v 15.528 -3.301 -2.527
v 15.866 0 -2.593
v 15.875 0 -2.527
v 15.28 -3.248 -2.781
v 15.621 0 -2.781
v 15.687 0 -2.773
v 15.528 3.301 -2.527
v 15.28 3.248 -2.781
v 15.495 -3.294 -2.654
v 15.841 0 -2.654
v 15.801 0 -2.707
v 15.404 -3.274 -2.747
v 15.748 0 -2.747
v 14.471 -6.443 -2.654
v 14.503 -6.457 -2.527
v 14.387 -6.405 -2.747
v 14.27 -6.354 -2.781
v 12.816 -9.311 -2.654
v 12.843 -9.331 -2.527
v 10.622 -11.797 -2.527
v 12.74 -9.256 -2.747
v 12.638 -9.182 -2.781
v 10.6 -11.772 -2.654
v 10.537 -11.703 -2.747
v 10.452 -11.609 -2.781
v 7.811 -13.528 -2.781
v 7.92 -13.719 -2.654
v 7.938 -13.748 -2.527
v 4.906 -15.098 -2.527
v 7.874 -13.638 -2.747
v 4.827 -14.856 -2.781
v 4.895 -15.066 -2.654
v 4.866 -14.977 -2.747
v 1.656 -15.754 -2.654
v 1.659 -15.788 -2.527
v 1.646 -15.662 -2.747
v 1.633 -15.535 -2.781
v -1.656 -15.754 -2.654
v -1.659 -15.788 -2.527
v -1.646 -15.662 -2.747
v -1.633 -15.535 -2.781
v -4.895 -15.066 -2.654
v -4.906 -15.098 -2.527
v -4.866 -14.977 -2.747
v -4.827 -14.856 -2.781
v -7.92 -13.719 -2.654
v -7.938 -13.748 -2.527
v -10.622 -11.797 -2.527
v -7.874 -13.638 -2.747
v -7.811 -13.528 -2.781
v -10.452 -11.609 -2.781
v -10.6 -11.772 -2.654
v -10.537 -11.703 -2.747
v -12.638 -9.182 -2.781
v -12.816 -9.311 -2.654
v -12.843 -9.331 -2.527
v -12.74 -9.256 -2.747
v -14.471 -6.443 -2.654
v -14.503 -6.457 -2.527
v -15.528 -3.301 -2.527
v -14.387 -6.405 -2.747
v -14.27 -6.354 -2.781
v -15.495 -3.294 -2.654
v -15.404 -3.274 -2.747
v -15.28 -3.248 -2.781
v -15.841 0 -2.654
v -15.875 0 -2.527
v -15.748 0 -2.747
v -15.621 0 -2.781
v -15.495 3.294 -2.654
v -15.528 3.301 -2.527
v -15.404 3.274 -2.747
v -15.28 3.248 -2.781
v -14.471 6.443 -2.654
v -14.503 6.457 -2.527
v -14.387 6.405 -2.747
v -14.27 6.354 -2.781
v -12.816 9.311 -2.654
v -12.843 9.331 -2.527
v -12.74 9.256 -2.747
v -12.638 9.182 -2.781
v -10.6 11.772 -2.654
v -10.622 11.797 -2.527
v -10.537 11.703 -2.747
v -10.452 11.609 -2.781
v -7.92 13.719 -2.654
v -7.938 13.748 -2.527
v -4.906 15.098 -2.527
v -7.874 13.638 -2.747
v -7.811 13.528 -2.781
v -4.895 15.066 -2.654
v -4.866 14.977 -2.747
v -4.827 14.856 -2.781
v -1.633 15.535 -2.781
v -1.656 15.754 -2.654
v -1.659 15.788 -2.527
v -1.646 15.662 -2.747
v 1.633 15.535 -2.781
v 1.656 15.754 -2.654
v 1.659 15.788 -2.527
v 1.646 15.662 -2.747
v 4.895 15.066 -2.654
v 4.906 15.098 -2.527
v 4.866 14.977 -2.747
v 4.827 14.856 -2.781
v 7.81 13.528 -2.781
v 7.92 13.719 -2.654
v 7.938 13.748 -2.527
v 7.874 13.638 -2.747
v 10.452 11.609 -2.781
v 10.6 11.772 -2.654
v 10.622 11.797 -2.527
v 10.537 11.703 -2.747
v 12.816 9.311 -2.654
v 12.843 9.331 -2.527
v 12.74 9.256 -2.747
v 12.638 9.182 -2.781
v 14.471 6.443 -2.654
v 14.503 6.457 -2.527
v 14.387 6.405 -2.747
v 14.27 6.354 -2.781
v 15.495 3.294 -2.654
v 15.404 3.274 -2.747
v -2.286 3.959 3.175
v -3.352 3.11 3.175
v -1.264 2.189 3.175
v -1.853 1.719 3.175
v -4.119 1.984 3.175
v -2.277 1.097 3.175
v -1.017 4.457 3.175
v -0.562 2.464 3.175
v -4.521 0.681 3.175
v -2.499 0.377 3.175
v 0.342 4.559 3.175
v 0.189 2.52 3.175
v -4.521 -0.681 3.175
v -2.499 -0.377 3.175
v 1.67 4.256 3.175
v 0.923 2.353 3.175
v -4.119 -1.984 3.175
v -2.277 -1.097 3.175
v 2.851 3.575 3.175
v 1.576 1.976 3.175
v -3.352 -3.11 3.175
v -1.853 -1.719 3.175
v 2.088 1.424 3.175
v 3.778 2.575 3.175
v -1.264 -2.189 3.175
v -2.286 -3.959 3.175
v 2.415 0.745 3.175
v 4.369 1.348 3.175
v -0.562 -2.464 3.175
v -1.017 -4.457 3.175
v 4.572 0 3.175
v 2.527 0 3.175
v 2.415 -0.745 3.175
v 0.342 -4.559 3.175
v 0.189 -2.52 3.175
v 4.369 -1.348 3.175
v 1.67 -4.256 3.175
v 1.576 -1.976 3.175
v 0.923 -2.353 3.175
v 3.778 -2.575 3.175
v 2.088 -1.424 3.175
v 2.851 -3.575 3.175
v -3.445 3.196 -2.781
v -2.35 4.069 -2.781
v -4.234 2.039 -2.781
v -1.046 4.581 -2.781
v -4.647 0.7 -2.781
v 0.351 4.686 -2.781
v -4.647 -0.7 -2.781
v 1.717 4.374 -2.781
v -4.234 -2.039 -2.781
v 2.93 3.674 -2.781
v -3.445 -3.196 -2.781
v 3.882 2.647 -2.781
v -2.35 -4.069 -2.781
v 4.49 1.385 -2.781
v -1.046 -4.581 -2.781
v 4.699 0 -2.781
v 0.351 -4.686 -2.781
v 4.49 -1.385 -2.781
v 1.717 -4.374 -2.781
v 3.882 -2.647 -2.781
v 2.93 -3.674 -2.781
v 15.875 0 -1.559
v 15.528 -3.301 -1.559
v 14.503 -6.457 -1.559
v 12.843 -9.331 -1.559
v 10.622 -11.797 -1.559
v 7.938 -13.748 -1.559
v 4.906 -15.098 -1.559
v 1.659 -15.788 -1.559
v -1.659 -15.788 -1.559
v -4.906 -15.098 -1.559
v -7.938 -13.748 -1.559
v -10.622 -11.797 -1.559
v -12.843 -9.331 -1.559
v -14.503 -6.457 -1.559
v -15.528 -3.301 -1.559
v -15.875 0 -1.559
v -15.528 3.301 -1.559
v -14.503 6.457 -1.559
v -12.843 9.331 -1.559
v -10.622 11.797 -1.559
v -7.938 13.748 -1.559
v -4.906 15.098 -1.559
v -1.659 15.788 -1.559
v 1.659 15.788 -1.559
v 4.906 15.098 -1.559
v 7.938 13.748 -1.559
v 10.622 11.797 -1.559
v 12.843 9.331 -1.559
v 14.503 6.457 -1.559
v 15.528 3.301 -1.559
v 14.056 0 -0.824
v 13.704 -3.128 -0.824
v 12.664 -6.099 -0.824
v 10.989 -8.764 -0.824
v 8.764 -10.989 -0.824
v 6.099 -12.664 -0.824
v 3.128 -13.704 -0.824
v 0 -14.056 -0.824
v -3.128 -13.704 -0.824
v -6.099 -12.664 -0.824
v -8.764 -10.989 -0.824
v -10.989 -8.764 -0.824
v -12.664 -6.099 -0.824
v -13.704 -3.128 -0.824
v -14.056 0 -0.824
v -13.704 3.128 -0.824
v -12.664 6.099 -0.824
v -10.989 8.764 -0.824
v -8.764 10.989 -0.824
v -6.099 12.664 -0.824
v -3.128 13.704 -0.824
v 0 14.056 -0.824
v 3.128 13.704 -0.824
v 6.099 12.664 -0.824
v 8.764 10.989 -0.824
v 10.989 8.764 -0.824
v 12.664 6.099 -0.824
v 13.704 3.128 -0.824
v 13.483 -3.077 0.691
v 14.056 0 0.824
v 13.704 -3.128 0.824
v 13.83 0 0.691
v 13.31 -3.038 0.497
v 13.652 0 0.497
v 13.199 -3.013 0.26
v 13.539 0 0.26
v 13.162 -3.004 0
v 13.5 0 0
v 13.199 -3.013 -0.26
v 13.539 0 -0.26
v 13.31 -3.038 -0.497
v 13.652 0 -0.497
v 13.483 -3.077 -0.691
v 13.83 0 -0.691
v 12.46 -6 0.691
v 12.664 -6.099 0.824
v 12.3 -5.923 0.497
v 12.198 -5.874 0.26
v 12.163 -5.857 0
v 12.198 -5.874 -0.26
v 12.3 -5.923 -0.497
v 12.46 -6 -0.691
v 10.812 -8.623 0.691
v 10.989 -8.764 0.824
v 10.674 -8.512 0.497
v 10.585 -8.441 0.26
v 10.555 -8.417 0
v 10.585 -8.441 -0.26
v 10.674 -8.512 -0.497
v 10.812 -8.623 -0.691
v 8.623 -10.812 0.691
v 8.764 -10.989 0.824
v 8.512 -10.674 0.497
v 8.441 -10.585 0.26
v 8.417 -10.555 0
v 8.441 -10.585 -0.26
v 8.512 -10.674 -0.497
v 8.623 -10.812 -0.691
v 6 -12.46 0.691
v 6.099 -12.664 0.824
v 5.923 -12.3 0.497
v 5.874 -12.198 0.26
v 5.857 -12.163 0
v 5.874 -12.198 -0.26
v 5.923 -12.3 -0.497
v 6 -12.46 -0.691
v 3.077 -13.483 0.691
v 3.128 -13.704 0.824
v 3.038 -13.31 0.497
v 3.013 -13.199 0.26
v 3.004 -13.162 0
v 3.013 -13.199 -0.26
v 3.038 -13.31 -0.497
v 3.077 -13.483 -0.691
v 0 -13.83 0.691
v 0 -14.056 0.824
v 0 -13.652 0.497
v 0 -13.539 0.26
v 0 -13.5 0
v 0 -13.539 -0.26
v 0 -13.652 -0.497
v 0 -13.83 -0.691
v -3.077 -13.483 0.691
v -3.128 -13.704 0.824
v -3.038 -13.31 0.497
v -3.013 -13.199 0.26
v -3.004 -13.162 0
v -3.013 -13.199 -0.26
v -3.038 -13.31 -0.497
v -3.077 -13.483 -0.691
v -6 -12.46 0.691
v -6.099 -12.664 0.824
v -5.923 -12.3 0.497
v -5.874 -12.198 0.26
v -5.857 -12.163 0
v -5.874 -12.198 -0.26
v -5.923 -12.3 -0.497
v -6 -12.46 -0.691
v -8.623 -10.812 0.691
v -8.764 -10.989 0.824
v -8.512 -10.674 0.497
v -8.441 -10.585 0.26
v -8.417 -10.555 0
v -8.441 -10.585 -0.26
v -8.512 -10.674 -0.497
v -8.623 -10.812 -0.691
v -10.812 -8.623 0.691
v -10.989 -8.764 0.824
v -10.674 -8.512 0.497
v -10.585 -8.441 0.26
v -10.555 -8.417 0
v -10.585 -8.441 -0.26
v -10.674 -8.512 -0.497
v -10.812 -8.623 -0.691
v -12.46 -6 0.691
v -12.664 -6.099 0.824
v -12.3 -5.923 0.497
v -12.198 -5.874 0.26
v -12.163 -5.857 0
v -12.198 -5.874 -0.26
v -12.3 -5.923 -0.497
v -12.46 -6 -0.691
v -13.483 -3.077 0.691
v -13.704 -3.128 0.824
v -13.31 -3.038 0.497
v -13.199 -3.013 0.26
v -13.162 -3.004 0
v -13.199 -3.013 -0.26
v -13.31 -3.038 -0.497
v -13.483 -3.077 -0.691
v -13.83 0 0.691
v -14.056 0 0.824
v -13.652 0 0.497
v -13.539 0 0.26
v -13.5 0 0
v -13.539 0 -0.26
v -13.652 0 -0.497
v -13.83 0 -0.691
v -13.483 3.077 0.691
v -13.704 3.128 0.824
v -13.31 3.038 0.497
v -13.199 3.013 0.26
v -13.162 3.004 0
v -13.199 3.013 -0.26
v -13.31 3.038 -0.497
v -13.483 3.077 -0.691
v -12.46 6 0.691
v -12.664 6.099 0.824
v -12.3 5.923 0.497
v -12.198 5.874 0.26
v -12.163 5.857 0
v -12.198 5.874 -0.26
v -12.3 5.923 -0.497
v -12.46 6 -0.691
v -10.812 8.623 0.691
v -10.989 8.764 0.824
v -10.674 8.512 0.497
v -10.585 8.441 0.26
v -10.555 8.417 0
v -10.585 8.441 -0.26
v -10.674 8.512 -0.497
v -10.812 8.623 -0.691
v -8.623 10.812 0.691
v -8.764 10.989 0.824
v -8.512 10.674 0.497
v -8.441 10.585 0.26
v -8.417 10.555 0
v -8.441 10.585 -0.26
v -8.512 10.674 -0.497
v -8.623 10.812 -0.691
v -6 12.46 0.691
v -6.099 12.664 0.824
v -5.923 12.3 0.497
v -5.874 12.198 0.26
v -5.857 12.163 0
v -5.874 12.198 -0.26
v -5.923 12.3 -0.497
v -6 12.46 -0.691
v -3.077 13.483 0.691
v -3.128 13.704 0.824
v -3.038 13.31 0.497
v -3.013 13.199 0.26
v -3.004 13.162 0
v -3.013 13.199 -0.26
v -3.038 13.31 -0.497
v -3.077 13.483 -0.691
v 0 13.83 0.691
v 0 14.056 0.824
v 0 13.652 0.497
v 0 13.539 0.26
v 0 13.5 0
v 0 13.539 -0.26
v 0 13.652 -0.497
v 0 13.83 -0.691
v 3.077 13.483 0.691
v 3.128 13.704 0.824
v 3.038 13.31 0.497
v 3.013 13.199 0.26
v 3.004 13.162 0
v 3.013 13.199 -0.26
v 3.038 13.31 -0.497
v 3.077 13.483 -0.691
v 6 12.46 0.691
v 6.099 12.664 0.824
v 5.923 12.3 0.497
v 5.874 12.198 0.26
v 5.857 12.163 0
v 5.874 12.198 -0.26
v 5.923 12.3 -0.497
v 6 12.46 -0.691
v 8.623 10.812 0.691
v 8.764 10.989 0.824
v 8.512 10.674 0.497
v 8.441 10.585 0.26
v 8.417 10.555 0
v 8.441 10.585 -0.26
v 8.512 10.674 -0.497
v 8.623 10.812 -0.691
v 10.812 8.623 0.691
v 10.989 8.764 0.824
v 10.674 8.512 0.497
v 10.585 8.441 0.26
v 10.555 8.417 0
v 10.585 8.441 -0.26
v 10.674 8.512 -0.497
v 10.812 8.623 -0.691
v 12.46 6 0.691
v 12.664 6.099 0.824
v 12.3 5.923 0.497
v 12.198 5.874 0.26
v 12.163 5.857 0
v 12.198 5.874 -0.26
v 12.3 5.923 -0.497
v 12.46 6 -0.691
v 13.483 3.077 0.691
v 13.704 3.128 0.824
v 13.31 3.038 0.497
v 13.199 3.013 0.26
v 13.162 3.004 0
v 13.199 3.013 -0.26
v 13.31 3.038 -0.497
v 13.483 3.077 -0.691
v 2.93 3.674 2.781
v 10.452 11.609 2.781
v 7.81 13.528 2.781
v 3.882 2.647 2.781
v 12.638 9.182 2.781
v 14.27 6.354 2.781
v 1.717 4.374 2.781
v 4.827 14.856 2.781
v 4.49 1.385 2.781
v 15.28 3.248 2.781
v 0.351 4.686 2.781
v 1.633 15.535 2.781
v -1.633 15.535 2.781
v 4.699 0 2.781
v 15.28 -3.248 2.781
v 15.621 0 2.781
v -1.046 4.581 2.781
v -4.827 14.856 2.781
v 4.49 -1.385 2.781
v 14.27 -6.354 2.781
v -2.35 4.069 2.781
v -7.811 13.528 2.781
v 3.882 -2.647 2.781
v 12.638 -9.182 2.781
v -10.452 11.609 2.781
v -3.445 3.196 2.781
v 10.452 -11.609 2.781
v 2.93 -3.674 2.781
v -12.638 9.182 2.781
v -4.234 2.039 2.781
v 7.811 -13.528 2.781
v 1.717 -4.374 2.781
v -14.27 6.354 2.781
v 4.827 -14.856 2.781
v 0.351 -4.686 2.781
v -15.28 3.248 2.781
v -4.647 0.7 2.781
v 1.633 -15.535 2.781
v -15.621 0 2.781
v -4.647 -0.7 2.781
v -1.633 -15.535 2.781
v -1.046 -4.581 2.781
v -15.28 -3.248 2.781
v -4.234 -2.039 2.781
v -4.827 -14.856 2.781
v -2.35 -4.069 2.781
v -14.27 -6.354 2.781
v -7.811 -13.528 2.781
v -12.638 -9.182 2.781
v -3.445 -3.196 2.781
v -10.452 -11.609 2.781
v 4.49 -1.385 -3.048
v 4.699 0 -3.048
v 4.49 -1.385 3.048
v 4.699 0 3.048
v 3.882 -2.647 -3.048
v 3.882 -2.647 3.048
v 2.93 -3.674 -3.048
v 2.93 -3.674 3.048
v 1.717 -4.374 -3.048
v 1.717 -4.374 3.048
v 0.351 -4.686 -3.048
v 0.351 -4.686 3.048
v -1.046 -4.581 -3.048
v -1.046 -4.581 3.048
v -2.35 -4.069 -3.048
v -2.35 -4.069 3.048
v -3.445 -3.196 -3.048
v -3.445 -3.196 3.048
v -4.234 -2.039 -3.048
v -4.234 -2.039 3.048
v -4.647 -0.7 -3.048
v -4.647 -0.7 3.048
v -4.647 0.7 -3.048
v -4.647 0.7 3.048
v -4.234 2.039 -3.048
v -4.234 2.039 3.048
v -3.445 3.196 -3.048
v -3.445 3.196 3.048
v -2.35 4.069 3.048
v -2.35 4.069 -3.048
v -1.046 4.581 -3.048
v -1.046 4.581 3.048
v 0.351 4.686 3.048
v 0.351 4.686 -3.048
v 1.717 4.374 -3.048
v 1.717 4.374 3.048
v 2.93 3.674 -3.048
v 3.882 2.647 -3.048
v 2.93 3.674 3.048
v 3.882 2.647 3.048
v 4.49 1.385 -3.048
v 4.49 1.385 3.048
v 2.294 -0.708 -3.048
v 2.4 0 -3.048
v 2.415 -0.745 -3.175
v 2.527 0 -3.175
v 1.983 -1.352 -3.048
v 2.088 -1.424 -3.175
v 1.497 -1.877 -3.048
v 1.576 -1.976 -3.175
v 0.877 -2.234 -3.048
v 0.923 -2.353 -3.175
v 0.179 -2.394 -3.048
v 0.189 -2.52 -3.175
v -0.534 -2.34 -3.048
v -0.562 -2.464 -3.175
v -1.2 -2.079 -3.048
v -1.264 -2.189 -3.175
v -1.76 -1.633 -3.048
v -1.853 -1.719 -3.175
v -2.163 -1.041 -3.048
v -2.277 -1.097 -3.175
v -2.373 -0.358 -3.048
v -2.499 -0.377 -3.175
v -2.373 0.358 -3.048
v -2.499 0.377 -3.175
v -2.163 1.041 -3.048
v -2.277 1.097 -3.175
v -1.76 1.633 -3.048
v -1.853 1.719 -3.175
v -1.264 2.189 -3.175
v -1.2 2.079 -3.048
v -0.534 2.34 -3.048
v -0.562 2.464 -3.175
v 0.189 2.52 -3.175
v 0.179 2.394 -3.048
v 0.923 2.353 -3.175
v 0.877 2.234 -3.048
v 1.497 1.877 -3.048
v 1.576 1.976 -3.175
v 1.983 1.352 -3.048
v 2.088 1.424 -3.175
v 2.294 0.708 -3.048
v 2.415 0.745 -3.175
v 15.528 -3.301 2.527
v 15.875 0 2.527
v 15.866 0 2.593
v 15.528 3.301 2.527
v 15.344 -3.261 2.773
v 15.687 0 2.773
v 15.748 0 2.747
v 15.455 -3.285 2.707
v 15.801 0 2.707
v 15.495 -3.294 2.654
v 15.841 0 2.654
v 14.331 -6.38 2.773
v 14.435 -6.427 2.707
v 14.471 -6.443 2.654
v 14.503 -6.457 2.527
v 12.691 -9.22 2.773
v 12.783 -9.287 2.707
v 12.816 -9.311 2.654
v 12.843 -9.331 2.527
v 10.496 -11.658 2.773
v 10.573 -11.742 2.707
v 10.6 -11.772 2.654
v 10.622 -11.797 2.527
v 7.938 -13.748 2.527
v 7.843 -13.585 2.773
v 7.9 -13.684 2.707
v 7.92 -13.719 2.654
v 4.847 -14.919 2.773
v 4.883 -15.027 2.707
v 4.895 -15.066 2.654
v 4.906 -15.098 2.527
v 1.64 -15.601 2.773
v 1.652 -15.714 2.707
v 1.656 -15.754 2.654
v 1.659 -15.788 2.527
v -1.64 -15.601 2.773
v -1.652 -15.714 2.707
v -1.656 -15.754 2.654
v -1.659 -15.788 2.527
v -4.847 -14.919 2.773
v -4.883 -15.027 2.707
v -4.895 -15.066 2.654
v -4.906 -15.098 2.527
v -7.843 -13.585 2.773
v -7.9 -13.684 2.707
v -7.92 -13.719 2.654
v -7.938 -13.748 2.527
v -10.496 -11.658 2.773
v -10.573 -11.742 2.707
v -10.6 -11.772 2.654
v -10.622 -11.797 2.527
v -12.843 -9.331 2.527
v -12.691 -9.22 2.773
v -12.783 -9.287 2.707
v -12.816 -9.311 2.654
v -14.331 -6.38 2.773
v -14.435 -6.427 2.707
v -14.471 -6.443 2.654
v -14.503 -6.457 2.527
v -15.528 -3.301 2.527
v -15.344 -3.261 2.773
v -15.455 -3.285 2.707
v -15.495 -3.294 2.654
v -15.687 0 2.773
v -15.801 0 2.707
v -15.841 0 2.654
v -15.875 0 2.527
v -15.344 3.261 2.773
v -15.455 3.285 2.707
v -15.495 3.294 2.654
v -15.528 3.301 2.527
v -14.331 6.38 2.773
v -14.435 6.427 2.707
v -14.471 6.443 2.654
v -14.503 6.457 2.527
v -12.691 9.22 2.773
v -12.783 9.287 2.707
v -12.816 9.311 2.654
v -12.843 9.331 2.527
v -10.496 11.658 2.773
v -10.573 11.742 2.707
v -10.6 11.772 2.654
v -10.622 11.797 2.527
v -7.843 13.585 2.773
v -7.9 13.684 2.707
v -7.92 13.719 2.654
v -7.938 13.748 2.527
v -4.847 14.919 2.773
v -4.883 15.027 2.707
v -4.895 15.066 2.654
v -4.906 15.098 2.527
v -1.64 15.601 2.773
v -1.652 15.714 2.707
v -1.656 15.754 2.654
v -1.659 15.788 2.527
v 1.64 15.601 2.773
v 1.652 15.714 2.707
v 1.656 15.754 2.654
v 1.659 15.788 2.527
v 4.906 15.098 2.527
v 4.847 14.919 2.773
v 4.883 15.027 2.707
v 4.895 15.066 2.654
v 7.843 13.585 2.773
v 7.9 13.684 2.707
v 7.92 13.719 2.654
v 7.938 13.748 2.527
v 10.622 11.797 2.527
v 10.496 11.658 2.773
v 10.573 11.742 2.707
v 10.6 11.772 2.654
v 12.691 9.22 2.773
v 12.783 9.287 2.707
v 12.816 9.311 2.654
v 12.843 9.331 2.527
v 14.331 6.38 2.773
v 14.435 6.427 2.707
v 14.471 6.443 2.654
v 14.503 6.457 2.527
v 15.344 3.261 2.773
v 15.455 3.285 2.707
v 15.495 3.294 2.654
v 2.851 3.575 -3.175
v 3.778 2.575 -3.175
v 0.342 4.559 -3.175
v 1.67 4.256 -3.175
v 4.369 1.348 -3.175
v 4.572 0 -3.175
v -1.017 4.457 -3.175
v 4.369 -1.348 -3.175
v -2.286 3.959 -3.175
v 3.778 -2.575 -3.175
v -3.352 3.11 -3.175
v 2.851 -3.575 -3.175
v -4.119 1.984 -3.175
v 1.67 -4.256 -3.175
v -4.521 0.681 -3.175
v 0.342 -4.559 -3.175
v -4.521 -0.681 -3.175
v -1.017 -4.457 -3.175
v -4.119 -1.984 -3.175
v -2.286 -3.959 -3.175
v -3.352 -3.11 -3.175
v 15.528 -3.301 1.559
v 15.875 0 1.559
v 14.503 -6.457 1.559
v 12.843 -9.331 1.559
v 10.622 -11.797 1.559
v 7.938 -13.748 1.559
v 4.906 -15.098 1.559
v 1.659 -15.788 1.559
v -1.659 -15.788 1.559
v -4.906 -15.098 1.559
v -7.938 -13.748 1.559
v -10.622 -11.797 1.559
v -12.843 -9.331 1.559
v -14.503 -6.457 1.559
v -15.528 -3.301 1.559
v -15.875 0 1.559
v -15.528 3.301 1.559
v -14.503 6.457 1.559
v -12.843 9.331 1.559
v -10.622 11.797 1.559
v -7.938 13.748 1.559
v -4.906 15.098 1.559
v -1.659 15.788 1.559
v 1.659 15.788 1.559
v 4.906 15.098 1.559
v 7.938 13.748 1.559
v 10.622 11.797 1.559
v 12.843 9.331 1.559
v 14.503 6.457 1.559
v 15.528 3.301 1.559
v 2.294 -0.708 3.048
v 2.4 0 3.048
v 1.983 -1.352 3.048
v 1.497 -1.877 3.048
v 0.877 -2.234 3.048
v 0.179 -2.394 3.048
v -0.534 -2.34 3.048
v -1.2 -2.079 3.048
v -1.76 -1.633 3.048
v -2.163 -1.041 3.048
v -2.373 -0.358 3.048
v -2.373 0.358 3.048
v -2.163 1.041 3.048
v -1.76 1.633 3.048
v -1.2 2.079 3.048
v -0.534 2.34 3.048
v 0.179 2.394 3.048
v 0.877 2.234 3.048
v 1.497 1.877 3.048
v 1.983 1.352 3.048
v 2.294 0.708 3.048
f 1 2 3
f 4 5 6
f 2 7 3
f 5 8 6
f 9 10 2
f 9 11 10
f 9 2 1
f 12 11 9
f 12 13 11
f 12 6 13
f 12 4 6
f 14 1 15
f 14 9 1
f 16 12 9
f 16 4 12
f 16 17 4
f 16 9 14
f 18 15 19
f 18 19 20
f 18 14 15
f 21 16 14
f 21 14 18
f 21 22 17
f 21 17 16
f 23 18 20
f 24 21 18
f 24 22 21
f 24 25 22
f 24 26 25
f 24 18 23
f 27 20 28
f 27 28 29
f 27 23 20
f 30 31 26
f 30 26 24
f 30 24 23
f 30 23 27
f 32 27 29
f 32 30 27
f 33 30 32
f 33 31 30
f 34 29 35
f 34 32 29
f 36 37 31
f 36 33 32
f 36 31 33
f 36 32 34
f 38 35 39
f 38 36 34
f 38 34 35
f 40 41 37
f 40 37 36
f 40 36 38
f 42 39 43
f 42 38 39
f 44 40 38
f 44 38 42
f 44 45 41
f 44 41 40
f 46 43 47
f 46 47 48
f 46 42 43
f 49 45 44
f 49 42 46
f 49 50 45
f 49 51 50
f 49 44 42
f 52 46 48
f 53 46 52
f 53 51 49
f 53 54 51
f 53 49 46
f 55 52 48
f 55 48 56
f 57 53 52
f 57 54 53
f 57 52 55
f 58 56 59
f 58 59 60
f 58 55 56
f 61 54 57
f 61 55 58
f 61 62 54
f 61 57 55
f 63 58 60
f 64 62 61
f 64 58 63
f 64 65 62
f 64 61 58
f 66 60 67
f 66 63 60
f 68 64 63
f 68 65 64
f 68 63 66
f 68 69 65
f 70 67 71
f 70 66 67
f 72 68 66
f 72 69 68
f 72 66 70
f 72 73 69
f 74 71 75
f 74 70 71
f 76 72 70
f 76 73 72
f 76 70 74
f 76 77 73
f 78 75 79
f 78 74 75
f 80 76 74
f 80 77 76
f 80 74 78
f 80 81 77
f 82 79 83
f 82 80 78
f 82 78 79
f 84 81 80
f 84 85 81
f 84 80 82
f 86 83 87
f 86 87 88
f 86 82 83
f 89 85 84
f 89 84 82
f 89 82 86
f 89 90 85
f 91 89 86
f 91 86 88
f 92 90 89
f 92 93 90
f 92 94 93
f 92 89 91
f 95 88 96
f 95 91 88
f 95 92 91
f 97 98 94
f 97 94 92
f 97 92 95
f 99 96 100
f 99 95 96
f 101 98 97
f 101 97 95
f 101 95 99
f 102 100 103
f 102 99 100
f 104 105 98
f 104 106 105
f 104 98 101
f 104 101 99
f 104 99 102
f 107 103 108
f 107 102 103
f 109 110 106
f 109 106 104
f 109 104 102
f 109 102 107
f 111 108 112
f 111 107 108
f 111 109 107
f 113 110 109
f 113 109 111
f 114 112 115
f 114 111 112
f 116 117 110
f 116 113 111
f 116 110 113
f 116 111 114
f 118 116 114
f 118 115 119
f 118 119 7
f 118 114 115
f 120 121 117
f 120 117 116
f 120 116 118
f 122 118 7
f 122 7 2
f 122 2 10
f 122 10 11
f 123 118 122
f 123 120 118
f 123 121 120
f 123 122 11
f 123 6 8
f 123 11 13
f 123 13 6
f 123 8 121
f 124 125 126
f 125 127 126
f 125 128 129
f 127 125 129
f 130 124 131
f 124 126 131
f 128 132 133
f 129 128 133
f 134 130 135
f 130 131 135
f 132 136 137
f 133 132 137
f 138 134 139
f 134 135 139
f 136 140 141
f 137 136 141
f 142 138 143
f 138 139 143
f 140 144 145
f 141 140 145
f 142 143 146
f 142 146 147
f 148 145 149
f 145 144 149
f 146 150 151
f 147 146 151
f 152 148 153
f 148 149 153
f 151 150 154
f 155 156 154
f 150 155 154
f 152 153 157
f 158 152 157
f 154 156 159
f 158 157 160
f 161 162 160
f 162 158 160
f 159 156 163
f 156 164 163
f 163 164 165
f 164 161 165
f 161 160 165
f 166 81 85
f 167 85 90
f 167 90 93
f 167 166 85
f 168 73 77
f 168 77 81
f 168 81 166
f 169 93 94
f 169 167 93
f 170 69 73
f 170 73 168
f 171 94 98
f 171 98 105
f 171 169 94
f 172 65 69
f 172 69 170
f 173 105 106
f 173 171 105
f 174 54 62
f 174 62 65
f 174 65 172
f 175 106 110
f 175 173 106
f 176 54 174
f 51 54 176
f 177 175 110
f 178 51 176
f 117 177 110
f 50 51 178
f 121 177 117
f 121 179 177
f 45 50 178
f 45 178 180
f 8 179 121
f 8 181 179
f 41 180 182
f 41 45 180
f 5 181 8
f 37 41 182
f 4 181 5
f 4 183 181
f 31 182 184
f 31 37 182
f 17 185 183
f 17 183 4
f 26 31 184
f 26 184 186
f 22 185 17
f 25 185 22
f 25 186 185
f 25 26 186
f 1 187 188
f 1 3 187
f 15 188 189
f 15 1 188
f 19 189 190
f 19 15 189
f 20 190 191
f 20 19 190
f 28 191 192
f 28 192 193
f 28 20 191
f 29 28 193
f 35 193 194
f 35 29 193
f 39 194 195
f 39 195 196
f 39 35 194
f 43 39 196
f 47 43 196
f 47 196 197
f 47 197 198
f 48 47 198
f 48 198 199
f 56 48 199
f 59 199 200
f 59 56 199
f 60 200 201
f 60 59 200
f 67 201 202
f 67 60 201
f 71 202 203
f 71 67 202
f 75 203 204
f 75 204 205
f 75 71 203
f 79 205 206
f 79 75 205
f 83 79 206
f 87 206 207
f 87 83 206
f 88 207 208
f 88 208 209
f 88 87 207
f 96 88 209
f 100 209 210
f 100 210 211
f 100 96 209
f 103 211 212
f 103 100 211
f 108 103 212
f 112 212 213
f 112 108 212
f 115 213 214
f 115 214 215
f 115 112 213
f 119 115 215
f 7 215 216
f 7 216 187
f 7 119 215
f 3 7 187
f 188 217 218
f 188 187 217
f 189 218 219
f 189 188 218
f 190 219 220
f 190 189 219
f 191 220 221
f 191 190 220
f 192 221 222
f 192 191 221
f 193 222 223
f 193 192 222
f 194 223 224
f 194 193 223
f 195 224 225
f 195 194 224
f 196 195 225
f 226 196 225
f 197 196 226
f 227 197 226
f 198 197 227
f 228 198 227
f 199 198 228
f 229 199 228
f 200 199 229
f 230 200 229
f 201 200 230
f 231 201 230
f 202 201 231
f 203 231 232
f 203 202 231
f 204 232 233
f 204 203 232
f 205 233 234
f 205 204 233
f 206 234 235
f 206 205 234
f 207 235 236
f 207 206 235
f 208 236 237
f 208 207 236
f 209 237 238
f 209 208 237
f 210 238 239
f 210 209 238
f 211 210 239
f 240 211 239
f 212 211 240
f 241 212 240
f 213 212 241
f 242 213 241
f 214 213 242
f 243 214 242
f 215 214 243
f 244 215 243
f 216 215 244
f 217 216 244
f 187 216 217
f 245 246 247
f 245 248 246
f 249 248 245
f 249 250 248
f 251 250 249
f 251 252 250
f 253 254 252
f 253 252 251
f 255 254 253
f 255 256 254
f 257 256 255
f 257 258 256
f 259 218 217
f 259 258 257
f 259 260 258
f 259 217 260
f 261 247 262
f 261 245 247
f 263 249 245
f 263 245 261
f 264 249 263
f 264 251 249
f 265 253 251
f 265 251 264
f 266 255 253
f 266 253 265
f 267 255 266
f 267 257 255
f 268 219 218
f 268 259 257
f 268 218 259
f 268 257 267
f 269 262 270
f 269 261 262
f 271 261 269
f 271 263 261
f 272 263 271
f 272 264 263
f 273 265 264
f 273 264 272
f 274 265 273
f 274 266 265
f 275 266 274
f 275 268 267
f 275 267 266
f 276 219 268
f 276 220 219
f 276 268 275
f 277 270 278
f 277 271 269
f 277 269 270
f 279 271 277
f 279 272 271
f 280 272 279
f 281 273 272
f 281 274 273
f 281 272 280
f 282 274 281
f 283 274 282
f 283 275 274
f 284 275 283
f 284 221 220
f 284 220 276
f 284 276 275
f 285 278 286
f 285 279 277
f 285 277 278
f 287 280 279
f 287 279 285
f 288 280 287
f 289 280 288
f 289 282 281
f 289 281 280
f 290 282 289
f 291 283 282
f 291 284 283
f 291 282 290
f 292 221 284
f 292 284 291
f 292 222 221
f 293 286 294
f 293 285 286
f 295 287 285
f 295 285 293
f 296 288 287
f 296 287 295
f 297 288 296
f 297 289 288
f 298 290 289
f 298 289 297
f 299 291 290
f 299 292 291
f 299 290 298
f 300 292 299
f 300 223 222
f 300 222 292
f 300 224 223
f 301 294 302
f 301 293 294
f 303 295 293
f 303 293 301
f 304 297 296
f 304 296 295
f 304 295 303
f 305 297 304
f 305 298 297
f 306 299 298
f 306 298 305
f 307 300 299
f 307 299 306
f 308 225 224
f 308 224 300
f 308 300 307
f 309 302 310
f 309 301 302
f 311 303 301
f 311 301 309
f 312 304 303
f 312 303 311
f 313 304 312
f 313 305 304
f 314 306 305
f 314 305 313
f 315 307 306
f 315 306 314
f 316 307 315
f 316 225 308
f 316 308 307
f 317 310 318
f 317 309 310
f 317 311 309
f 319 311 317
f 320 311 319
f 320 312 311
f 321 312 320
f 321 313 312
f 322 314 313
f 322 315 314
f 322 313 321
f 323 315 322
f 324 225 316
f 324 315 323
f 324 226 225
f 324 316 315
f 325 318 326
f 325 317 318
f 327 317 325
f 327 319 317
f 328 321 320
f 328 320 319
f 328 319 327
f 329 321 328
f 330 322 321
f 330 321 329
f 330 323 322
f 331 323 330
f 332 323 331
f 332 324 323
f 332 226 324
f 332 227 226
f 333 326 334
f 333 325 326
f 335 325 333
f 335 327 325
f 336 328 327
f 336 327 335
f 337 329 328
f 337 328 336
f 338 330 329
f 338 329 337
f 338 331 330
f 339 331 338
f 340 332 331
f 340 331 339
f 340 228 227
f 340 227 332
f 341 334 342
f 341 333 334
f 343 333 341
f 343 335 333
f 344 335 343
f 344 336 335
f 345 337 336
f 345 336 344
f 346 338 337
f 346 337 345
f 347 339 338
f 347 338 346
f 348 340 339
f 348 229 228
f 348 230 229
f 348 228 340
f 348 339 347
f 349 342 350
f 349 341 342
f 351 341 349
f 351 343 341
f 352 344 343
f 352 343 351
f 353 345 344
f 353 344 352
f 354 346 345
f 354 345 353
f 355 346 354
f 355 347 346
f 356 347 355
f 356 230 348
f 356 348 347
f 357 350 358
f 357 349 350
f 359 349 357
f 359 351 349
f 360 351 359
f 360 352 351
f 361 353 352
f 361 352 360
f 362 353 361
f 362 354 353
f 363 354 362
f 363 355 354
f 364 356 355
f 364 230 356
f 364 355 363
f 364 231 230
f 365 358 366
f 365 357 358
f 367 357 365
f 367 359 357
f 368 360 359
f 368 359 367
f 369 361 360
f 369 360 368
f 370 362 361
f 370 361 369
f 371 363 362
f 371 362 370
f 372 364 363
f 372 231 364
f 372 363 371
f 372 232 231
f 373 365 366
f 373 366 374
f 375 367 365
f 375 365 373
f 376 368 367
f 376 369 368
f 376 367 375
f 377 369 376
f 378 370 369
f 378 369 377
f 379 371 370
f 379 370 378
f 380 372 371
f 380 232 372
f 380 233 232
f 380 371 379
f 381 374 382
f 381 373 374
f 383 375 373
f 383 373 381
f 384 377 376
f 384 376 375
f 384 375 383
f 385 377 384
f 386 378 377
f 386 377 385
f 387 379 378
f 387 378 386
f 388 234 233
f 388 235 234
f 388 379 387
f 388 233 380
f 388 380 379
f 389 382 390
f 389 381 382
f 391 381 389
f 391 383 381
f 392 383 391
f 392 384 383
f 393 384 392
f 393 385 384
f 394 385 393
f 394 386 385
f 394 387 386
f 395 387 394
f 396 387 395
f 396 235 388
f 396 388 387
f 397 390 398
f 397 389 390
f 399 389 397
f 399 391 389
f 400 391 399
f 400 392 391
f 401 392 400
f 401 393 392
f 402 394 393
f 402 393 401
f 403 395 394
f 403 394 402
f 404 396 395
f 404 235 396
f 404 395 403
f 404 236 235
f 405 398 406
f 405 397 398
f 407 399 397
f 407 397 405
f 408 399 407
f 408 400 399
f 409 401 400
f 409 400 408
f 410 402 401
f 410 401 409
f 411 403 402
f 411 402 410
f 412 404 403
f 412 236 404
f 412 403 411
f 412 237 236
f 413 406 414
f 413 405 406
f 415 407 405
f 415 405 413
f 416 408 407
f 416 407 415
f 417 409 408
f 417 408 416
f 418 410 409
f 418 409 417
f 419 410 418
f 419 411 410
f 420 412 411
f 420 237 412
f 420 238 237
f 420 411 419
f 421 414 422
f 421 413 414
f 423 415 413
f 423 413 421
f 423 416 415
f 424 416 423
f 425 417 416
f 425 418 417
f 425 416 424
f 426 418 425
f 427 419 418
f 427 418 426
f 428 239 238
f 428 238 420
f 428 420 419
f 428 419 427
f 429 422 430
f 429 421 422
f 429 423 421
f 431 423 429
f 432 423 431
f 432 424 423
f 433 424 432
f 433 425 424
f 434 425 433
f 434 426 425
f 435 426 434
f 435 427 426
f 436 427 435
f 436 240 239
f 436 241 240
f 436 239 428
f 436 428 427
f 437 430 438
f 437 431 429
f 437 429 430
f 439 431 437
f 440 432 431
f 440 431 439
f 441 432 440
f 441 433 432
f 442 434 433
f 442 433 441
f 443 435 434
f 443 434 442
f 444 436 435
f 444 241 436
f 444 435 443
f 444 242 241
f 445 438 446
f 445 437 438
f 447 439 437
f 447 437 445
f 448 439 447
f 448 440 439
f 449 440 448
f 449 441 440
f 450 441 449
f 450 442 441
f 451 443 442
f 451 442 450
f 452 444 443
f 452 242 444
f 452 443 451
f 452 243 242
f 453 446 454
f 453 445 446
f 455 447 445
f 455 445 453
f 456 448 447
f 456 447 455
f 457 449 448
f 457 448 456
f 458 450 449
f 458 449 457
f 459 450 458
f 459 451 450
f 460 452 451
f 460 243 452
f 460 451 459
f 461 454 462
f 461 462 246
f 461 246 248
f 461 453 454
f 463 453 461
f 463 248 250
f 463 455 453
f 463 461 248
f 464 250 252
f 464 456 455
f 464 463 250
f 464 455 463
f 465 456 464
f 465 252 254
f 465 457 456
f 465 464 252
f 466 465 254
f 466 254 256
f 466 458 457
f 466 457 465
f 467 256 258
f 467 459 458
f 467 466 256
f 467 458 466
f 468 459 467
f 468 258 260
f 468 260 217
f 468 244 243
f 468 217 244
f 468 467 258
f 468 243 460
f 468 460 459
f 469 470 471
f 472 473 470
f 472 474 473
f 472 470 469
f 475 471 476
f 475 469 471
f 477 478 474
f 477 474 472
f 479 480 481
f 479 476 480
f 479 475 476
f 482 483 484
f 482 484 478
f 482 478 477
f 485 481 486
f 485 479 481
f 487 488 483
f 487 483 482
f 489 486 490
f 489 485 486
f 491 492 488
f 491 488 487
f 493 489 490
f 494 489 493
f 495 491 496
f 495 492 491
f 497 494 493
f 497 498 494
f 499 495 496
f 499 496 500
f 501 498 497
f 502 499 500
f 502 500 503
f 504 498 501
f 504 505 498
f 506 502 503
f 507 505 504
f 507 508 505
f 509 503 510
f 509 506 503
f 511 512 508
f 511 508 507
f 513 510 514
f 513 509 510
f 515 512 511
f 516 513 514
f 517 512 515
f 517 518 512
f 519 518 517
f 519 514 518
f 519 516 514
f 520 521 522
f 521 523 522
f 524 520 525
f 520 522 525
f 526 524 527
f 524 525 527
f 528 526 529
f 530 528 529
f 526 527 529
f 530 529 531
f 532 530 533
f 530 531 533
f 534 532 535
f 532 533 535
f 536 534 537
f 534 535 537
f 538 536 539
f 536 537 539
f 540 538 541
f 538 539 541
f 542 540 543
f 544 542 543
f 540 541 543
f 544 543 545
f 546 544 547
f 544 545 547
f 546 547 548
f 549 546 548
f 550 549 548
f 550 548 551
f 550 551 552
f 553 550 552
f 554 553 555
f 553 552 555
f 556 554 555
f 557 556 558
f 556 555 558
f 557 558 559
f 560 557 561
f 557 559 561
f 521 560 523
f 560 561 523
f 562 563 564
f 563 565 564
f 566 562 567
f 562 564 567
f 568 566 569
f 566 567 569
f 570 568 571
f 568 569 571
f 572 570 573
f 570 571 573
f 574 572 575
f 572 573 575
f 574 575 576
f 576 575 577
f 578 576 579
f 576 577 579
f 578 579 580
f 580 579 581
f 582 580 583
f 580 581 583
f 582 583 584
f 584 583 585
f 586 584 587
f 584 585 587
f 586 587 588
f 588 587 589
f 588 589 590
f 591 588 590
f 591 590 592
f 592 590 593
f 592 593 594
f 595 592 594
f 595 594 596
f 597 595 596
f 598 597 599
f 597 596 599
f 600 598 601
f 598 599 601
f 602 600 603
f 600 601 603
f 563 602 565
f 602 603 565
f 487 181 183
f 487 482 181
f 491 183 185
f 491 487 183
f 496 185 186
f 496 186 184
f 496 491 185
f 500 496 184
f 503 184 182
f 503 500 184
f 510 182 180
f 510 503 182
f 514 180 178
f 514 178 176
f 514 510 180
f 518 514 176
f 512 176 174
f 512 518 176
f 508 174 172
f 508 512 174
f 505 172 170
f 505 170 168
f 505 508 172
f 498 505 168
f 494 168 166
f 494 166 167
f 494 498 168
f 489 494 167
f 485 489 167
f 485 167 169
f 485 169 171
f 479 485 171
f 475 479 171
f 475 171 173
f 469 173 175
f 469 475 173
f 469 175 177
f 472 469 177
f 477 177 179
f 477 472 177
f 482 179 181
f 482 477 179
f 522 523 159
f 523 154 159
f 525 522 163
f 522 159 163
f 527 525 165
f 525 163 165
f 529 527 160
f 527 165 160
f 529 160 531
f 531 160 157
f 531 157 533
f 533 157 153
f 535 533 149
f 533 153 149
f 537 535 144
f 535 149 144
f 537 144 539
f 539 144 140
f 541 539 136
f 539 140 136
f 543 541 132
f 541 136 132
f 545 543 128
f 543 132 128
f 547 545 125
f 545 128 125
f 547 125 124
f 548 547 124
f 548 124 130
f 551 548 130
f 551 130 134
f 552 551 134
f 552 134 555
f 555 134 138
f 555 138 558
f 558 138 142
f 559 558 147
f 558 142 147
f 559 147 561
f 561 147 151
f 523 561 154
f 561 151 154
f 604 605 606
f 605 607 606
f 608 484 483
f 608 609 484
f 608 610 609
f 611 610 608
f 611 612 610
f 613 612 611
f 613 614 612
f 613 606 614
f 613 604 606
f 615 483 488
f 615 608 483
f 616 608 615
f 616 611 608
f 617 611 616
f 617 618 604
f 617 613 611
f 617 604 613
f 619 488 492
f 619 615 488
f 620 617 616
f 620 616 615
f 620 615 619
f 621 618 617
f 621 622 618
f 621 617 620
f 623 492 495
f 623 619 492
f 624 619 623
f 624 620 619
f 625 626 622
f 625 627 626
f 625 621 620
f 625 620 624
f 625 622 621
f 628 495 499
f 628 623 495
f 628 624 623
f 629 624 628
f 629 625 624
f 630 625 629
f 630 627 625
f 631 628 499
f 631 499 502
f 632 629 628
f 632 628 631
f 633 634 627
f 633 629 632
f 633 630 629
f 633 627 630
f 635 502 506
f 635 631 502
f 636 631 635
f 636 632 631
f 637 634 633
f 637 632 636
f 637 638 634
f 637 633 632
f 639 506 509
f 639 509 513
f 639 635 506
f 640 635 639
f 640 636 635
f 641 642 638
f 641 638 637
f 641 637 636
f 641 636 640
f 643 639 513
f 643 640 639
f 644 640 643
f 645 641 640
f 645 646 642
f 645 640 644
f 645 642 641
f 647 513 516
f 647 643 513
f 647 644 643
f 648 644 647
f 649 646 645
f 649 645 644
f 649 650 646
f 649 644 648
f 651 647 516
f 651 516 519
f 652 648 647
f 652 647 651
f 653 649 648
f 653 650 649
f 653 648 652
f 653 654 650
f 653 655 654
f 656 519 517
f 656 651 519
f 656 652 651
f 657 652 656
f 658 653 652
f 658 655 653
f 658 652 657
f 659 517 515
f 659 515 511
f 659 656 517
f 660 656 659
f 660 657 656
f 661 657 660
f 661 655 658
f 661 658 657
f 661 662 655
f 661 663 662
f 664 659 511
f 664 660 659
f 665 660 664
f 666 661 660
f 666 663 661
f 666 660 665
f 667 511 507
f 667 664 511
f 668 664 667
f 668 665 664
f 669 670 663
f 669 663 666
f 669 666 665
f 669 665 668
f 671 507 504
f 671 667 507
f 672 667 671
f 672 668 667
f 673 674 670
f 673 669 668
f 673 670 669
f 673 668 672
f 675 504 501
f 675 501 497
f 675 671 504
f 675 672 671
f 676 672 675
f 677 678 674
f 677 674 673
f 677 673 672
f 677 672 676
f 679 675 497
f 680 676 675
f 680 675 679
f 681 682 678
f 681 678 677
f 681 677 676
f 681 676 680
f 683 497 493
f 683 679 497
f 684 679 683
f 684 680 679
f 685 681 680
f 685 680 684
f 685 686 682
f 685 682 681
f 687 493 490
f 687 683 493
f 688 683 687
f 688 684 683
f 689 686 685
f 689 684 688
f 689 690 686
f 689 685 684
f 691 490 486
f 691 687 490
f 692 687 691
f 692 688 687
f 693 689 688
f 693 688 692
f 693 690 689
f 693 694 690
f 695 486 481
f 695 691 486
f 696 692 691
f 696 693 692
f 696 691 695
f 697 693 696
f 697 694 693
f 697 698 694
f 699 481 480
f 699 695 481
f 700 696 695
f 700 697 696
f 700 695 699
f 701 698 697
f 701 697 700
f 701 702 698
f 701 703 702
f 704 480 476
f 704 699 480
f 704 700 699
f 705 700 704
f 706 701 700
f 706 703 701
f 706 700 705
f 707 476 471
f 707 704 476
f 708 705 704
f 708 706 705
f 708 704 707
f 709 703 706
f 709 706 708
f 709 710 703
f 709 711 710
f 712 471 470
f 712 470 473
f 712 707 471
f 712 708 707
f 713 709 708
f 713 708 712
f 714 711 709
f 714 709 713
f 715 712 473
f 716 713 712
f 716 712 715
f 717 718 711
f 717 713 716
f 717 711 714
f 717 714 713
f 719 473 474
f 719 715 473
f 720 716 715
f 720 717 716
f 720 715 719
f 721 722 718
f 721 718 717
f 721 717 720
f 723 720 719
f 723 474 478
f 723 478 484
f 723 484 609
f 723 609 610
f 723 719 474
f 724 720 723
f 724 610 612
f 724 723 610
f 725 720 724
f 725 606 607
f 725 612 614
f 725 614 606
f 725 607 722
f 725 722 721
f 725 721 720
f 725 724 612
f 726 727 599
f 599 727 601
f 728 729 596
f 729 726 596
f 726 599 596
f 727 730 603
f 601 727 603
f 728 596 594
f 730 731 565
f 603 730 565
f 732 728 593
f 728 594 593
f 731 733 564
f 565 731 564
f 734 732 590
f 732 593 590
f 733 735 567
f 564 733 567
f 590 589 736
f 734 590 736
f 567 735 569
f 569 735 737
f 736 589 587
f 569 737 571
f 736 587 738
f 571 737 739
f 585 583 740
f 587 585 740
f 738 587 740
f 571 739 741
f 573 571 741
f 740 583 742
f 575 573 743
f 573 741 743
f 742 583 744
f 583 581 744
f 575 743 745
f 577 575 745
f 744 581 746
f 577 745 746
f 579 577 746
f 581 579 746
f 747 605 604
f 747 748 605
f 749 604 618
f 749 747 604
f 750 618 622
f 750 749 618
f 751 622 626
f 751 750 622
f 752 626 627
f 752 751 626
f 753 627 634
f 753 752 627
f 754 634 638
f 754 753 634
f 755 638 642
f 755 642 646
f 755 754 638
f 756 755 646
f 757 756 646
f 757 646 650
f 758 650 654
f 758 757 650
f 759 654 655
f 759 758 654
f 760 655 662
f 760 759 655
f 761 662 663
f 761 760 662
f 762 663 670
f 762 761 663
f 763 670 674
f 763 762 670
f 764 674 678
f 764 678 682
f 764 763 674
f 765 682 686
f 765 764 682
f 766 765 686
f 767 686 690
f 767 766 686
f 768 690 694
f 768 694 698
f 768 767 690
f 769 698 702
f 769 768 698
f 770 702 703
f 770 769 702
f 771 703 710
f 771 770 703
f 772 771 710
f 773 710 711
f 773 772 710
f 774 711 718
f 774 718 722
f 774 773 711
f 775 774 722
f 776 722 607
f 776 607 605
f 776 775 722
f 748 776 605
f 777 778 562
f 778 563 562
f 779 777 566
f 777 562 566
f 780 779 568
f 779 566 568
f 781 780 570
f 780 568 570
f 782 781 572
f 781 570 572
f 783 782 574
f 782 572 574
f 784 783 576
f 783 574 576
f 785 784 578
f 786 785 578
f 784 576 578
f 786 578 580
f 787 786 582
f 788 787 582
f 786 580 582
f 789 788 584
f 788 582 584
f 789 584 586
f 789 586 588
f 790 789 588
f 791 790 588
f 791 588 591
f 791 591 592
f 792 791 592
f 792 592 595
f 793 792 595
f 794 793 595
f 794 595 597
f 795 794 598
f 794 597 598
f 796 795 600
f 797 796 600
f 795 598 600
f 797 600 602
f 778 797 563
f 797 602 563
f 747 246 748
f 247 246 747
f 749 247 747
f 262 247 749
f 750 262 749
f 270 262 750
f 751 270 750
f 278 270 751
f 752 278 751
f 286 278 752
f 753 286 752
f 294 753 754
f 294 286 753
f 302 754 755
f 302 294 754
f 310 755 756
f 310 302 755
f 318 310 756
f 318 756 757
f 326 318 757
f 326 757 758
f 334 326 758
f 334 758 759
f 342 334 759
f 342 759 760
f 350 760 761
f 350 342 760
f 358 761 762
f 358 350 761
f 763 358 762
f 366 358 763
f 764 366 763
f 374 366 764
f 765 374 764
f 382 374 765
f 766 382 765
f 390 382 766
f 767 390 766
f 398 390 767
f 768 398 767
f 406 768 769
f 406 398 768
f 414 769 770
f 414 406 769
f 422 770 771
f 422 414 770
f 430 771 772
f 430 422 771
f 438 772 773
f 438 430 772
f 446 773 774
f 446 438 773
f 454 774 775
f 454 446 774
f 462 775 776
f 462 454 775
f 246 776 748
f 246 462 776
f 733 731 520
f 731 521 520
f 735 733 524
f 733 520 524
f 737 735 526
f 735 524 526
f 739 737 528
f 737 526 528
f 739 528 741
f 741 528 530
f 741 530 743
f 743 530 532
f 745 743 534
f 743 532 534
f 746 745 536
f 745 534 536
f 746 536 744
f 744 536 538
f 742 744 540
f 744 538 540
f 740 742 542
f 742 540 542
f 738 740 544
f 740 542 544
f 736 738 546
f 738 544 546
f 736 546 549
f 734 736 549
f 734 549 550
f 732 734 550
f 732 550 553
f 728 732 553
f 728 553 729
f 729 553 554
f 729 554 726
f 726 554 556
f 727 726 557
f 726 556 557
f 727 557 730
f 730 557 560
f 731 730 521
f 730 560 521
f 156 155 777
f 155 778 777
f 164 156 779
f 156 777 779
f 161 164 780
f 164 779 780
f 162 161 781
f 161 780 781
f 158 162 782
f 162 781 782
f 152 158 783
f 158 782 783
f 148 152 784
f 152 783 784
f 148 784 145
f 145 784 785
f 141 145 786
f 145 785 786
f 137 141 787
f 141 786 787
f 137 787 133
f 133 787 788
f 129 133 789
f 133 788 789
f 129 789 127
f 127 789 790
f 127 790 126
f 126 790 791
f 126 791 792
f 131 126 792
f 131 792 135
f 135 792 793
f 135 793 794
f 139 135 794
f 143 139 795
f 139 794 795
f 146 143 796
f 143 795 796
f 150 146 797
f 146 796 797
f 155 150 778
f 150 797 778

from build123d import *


with BuildPart() as part:
    # Sketch2 → Bushing Revolve (revolve)
    with BuildSketch(Plane(origin=(0, 0, 0), x_dir=(0, 0, -1), z_dir=(1, 0, 0)), mode=Mode.PRIVATE) as bushing_revolve_sk:
        Polygon((-3.175, 4.572), (-3.175, 2.5273), (-3.048, 2.4003), (3.048, 2.4003), (3.175, 2.5273), (3.175, 4.572), (3.048, 4.699), (-3.048, 4.699), align=None)
    revolve(bushing_revolve_sk.sketch.rotate(Axis((0, 0, 3.175), (0, 0, -1)), 90), axis=Axis((0, 0, 3.175), (0, 0, -1)))


with BuildPart() as body_2:
    # Sketch3 → Sheave Revolve (revolve)
    with BuildSketch(Plane(origin=(0, 0, 0), x_dir=(0, 0, -1), z_dir=(1, 0, 0)), mode=Mode.PRIVATE) as sheave_revolve_sk:
        with BuildLine():
            Line((2.7813, 4.699), (-2.7813, 4.699))
            Line((-2.7813, 4.699), (-2.7813, 15.621))
            ThreePointArc((-2.7813, 15.621), (-2.706905122, 15.800605122), (-2.5273, 15.875))
            Line((-2.5273, 15.875), (-1.559159955, 15.875))
            Line((-1.559159955, 15.875), (-0.824266447, 14.056074738))
            ThreePointArc((-0.824266447, 14.056074738), (0, 13.5001), (0.824266447, 14.056074738))
            Line((0.824266447, 14.056074738), (1.559159955, 15.875))
            Line((1.559159955, 15.875), (2.5273, 15.875))
            ThreePointArc((2.5273, 15.875), (2.706905122, 15.800605122), (2.7813, 15.621))
            Line((2.7813, 15.621), (2.7813, 4.699))
        make_face()
    revolve(sheave_revolve_sk.sketch.rotate(Axis((0, 0, 3.175), (0, 0, -1)), 90), axis=Axis((0, 0, 3.175), (0, 0, -1)))


solid = Compound([part.part, body_2.part])
